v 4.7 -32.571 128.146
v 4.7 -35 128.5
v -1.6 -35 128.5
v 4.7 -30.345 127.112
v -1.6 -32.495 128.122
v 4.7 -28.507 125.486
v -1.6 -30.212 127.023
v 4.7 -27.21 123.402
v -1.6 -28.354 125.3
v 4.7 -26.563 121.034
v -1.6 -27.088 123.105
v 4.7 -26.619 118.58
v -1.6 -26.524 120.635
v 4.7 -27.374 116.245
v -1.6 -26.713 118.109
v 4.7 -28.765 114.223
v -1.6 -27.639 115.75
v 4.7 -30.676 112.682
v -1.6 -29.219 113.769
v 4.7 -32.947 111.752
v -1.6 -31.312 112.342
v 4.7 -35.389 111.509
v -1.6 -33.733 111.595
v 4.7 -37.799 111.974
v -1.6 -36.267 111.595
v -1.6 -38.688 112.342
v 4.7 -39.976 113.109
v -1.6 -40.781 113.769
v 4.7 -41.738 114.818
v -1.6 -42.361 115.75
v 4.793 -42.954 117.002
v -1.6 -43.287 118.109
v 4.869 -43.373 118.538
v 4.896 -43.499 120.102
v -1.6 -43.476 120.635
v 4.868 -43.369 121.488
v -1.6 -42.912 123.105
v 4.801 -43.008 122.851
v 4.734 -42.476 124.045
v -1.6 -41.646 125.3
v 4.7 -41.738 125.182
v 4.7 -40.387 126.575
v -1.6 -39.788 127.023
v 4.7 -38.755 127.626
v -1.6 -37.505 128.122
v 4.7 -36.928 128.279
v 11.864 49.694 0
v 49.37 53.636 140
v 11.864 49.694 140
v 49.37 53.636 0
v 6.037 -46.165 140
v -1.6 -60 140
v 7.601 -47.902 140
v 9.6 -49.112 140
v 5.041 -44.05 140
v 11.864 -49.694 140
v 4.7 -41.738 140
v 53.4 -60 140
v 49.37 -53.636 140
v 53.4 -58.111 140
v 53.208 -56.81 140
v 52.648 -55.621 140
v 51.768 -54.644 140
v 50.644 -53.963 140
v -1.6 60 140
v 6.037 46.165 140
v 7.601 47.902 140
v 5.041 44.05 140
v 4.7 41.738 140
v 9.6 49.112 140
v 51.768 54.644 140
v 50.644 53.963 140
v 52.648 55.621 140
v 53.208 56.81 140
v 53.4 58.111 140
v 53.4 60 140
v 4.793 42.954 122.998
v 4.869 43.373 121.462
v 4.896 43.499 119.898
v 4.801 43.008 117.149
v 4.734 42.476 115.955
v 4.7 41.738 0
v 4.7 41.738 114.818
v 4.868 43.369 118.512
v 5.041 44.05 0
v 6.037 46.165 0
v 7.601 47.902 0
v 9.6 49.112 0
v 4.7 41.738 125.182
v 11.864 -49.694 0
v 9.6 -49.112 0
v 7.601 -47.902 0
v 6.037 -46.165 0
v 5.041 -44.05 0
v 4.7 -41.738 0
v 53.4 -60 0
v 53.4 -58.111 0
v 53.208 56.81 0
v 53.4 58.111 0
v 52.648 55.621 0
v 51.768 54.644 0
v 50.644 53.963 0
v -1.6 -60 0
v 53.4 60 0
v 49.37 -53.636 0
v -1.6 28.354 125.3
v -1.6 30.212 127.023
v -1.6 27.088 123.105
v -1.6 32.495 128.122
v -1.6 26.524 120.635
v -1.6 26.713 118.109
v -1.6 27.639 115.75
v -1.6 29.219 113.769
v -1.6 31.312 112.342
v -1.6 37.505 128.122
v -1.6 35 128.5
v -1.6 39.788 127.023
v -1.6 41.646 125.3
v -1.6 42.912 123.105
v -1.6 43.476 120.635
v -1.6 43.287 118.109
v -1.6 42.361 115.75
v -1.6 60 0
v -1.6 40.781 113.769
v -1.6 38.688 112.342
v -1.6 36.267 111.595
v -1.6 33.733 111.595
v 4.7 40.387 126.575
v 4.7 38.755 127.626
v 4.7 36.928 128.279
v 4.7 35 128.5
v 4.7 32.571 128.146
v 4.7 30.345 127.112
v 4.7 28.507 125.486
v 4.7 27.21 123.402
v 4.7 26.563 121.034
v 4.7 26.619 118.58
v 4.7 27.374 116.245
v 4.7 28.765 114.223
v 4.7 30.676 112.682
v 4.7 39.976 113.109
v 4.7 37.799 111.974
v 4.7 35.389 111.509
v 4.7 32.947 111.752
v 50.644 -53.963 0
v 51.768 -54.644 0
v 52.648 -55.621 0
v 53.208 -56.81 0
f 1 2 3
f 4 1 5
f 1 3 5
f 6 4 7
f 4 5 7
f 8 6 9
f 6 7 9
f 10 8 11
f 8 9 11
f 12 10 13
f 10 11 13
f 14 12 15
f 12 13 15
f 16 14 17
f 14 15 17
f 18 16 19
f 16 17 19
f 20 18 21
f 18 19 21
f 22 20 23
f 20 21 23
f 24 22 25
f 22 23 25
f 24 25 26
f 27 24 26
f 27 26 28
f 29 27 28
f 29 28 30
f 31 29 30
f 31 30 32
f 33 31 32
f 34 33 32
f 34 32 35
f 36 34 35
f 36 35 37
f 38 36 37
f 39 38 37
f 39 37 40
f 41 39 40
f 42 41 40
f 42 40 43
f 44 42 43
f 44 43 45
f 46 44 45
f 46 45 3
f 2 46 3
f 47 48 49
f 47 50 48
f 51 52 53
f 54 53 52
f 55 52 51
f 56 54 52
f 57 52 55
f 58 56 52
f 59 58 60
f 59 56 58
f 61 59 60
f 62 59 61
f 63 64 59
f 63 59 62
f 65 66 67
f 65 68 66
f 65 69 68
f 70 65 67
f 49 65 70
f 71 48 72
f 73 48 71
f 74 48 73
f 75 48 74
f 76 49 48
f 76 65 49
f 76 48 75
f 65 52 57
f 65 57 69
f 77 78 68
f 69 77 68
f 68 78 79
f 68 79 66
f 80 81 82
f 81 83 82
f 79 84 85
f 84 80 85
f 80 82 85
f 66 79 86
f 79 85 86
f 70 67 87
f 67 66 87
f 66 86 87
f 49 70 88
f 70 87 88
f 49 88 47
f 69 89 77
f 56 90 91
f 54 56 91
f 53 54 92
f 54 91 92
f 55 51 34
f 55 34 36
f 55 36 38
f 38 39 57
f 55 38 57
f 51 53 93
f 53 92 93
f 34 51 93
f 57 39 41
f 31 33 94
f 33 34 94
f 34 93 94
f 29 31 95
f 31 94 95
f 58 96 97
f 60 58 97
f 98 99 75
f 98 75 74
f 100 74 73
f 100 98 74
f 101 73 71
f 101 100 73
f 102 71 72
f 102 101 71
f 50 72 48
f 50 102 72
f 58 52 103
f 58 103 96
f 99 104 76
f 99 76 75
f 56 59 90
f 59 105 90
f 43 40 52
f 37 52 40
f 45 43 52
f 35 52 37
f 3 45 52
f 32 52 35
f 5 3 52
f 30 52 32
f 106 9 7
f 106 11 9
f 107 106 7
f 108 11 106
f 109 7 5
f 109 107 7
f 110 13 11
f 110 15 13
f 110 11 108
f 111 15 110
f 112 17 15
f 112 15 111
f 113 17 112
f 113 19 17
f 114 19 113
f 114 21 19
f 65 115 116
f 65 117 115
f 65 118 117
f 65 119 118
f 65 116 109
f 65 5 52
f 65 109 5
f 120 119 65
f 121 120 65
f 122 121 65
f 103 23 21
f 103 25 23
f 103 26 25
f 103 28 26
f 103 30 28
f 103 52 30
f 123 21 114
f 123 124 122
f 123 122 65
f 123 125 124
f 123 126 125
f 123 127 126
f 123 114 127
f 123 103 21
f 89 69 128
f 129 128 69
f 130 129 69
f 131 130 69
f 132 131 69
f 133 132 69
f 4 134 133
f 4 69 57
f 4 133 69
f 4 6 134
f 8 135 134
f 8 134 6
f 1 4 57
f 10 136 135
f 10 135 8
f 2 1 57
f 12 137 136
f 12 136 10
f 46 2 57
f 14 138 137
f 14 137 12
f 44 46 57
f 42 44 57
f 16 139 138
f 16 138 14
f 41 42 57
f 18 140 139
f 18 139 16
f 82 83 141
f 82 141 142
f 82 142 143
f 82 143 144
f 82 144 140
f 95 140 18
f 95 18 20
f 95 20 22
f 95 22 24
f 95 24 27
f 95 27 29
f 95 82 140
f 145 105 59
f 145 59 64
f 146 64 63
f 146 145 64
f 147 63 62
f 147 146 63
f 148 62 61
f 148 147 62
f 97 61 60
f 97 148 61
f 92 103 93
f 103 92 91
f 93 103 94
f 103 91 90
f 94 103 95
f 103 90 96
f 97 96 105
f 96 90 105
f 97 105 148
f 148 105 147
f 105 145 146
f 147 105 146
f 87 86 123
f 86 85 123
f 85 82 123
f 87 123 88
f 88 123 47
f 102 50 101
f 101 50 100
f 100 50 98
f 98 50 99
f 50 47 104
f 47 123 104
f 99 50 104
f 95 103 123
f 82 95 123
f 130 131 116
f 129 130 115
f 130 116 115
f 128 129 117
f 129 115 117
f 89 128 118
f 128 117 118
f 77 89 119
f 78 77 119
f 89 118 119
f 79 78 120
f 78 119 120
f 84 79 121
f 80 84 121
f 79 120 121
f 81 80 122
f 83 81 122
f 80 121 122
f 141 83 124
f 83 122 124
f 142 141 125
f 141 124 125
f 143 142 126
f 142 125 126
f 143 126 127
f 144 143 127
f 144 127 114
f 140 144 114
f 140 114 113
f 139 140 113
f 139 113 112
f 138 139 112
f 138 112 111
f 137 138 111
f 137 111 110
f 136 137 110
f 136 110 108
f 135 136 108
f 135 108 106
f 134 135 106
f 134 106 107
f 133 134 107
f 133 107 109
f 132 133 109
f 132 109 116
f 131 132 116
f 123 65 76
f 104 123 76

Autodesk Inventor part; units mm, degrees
ref_plane "YZ Plane" through (0, 0, 0) normal (1, 0, 0) x (0, 1, 0)
ref_plane "Start plane" through (0, 0, 0) normal (0, 0, 1) x (1, 0, 0)
ref_plane "End plane" through (0, 0, 140) normal (0, 0, 1) x (1, 0, 0)
sketch "Sketch" plane through (0, 0, 0) normal (0, 0, 1) x (1, 0, 0)
  line L0 (-1.6, 0) -> (-1.6, 60)
  line L1 (-1.6, 60) -> (53.4, 60)
  line L2 (53.4, 60) -> (53.4, 58.1111)
  line L3 (49.3704, 53.6358) -> (11.8638, 49.6937)
  line L4 (4.7, 41.7375) -> (4.7, 0)
  line L5 (4.7, 0) -> (-1.6, 0) construction
  line L6 (29.05, 60) -> (29.05, 51.5) construction
  line L7 (53.4, 54.0593) -> (53.4, 51.5) construction
  line L8 (53.4, 51.5) -> (29.05, 51.5) construction
  line L9 (0, 15) -> (0, -27) construction
  line L10 (-5.539, 0) -> (16.0067, 0) construction
  line L11 (-1.6, 0) -> (-1.6, -60)
  line L12 (-1.6, -60) -> (53.4, -60)
  line L13 (53.4, -60) -> (53.4, -58.1111)
  line L14 (49.3704, -53.6358) -> (11.8638, -49.6937)
  line L15 (4.7, -41.7375) -> (4.7, 0)
  arc A0 (11.8638, 49.6937) -> (4.7, 41.7375) centre (12.7, 41.7375) ccw
  arc A1 (4.7, -41.7375) -> (11.8638, -49.6937) centre (12.7, -41.7375) ccw
  arc A2 (49.3704, 53.6358) -> (53.4, 58.1111) centre (48.9, 58.1111) ccw
  arc A3 (53.4, -58.1111) -> (49.3704, -53.6358) centre (48.9, -58.1111) ccw
  line L16 (0, 23.4) -> (0, -35.4) construction
  line L17 (-9.8481, 0) -> (20.3158, 0) construction
  point P0 (4.7, 48.9407)
  point P1 (53.4, -54.0593)
  point P2 (4.7, -48.9407)
  point P3 (29.05, -60)
  point P4 (29.05, -51.5)
  dimension "d0" = 6.3
  dimension "d1" = 60
  dimension "d2" = 55
  dimension "d3" = 8.5
  dimension "d4" = 24.35
  dimension "d5" = 2.5593
  dimension "d23" = 8
  dimension "d24" = 4.5
  dimension "d25" = 1.6
extrude "Body" add sketch "Sketch" along normal up to surface (140 mm away) from surface at 0
sketch "Sketch3" plane through (0, 0, 0) normal (0, 0, 1) x (1, 0, 0)
  line L0 (0, 0) -> (10, 0)
ref_plane "Work Plane3" through (0, 0, 0) normal (0, -1, 0) x (1, 0, 0)
sketch "Sketch5" plane through (-1.6, 60, 0) normal (-1, 0, 0) x (0, 0, 1)
  circle A0 centre (120, -25) radius 8.5
  circle A1 centre (120, -95) radius 8.5
  line L0 (140, -120) -> (140, 0) projected
  line L1 (140, -60) -> (0, -60)
  dimension "d30" = 17
  dimension "d31" = 20
  dimension "d32" = 70
extrude "Extrusion2" cut sketch "Sketch5" against normal through all
sketch "Sketch4" plane through (0, 0, 0) normal (0, -1, 0) x (1, 0, 0)
  line L0 (-2, 0) -> (12, 0) projected
  line L1 (-2, 140) -> (12, 140) projected
  dimension "d29" = 140
equation "\"d0\" = G_T"
equation "\"d1\" = 0.5 * G_H"
equation "\"d2\" = G_W"
equation "\"d3\" = G_T1"
equation "\"d4\" = G_C"
equation "\"d23\" = G_IR"
equation "\"d24\" = G_ER"
equation "\"d25\" = ex"
equation "\"d6\" = G_L"
equation "\"G_W\" = 55"
equation "\"G_T\" = 6.3"
equation "\"G_T1\" = 8.5"
equation "\"G_NG\" = 0.105104"
equation "\"G_ER\" = 4.5"
equation "\"G_IR\" = 8"
equation "\"G_C\" = 24.35"
equation "\"G_L\" = d29"
equation "\"ex\" = 1.6"
equation "\"G_OFFSET_START\" = 0"
equation "\"G_OFFSET_END\" = 0"
equation "\"G_H\" = 120"
properties part number "ISO 657/11 - CH 120 x 12 - 140" material "Steel, Mild"
